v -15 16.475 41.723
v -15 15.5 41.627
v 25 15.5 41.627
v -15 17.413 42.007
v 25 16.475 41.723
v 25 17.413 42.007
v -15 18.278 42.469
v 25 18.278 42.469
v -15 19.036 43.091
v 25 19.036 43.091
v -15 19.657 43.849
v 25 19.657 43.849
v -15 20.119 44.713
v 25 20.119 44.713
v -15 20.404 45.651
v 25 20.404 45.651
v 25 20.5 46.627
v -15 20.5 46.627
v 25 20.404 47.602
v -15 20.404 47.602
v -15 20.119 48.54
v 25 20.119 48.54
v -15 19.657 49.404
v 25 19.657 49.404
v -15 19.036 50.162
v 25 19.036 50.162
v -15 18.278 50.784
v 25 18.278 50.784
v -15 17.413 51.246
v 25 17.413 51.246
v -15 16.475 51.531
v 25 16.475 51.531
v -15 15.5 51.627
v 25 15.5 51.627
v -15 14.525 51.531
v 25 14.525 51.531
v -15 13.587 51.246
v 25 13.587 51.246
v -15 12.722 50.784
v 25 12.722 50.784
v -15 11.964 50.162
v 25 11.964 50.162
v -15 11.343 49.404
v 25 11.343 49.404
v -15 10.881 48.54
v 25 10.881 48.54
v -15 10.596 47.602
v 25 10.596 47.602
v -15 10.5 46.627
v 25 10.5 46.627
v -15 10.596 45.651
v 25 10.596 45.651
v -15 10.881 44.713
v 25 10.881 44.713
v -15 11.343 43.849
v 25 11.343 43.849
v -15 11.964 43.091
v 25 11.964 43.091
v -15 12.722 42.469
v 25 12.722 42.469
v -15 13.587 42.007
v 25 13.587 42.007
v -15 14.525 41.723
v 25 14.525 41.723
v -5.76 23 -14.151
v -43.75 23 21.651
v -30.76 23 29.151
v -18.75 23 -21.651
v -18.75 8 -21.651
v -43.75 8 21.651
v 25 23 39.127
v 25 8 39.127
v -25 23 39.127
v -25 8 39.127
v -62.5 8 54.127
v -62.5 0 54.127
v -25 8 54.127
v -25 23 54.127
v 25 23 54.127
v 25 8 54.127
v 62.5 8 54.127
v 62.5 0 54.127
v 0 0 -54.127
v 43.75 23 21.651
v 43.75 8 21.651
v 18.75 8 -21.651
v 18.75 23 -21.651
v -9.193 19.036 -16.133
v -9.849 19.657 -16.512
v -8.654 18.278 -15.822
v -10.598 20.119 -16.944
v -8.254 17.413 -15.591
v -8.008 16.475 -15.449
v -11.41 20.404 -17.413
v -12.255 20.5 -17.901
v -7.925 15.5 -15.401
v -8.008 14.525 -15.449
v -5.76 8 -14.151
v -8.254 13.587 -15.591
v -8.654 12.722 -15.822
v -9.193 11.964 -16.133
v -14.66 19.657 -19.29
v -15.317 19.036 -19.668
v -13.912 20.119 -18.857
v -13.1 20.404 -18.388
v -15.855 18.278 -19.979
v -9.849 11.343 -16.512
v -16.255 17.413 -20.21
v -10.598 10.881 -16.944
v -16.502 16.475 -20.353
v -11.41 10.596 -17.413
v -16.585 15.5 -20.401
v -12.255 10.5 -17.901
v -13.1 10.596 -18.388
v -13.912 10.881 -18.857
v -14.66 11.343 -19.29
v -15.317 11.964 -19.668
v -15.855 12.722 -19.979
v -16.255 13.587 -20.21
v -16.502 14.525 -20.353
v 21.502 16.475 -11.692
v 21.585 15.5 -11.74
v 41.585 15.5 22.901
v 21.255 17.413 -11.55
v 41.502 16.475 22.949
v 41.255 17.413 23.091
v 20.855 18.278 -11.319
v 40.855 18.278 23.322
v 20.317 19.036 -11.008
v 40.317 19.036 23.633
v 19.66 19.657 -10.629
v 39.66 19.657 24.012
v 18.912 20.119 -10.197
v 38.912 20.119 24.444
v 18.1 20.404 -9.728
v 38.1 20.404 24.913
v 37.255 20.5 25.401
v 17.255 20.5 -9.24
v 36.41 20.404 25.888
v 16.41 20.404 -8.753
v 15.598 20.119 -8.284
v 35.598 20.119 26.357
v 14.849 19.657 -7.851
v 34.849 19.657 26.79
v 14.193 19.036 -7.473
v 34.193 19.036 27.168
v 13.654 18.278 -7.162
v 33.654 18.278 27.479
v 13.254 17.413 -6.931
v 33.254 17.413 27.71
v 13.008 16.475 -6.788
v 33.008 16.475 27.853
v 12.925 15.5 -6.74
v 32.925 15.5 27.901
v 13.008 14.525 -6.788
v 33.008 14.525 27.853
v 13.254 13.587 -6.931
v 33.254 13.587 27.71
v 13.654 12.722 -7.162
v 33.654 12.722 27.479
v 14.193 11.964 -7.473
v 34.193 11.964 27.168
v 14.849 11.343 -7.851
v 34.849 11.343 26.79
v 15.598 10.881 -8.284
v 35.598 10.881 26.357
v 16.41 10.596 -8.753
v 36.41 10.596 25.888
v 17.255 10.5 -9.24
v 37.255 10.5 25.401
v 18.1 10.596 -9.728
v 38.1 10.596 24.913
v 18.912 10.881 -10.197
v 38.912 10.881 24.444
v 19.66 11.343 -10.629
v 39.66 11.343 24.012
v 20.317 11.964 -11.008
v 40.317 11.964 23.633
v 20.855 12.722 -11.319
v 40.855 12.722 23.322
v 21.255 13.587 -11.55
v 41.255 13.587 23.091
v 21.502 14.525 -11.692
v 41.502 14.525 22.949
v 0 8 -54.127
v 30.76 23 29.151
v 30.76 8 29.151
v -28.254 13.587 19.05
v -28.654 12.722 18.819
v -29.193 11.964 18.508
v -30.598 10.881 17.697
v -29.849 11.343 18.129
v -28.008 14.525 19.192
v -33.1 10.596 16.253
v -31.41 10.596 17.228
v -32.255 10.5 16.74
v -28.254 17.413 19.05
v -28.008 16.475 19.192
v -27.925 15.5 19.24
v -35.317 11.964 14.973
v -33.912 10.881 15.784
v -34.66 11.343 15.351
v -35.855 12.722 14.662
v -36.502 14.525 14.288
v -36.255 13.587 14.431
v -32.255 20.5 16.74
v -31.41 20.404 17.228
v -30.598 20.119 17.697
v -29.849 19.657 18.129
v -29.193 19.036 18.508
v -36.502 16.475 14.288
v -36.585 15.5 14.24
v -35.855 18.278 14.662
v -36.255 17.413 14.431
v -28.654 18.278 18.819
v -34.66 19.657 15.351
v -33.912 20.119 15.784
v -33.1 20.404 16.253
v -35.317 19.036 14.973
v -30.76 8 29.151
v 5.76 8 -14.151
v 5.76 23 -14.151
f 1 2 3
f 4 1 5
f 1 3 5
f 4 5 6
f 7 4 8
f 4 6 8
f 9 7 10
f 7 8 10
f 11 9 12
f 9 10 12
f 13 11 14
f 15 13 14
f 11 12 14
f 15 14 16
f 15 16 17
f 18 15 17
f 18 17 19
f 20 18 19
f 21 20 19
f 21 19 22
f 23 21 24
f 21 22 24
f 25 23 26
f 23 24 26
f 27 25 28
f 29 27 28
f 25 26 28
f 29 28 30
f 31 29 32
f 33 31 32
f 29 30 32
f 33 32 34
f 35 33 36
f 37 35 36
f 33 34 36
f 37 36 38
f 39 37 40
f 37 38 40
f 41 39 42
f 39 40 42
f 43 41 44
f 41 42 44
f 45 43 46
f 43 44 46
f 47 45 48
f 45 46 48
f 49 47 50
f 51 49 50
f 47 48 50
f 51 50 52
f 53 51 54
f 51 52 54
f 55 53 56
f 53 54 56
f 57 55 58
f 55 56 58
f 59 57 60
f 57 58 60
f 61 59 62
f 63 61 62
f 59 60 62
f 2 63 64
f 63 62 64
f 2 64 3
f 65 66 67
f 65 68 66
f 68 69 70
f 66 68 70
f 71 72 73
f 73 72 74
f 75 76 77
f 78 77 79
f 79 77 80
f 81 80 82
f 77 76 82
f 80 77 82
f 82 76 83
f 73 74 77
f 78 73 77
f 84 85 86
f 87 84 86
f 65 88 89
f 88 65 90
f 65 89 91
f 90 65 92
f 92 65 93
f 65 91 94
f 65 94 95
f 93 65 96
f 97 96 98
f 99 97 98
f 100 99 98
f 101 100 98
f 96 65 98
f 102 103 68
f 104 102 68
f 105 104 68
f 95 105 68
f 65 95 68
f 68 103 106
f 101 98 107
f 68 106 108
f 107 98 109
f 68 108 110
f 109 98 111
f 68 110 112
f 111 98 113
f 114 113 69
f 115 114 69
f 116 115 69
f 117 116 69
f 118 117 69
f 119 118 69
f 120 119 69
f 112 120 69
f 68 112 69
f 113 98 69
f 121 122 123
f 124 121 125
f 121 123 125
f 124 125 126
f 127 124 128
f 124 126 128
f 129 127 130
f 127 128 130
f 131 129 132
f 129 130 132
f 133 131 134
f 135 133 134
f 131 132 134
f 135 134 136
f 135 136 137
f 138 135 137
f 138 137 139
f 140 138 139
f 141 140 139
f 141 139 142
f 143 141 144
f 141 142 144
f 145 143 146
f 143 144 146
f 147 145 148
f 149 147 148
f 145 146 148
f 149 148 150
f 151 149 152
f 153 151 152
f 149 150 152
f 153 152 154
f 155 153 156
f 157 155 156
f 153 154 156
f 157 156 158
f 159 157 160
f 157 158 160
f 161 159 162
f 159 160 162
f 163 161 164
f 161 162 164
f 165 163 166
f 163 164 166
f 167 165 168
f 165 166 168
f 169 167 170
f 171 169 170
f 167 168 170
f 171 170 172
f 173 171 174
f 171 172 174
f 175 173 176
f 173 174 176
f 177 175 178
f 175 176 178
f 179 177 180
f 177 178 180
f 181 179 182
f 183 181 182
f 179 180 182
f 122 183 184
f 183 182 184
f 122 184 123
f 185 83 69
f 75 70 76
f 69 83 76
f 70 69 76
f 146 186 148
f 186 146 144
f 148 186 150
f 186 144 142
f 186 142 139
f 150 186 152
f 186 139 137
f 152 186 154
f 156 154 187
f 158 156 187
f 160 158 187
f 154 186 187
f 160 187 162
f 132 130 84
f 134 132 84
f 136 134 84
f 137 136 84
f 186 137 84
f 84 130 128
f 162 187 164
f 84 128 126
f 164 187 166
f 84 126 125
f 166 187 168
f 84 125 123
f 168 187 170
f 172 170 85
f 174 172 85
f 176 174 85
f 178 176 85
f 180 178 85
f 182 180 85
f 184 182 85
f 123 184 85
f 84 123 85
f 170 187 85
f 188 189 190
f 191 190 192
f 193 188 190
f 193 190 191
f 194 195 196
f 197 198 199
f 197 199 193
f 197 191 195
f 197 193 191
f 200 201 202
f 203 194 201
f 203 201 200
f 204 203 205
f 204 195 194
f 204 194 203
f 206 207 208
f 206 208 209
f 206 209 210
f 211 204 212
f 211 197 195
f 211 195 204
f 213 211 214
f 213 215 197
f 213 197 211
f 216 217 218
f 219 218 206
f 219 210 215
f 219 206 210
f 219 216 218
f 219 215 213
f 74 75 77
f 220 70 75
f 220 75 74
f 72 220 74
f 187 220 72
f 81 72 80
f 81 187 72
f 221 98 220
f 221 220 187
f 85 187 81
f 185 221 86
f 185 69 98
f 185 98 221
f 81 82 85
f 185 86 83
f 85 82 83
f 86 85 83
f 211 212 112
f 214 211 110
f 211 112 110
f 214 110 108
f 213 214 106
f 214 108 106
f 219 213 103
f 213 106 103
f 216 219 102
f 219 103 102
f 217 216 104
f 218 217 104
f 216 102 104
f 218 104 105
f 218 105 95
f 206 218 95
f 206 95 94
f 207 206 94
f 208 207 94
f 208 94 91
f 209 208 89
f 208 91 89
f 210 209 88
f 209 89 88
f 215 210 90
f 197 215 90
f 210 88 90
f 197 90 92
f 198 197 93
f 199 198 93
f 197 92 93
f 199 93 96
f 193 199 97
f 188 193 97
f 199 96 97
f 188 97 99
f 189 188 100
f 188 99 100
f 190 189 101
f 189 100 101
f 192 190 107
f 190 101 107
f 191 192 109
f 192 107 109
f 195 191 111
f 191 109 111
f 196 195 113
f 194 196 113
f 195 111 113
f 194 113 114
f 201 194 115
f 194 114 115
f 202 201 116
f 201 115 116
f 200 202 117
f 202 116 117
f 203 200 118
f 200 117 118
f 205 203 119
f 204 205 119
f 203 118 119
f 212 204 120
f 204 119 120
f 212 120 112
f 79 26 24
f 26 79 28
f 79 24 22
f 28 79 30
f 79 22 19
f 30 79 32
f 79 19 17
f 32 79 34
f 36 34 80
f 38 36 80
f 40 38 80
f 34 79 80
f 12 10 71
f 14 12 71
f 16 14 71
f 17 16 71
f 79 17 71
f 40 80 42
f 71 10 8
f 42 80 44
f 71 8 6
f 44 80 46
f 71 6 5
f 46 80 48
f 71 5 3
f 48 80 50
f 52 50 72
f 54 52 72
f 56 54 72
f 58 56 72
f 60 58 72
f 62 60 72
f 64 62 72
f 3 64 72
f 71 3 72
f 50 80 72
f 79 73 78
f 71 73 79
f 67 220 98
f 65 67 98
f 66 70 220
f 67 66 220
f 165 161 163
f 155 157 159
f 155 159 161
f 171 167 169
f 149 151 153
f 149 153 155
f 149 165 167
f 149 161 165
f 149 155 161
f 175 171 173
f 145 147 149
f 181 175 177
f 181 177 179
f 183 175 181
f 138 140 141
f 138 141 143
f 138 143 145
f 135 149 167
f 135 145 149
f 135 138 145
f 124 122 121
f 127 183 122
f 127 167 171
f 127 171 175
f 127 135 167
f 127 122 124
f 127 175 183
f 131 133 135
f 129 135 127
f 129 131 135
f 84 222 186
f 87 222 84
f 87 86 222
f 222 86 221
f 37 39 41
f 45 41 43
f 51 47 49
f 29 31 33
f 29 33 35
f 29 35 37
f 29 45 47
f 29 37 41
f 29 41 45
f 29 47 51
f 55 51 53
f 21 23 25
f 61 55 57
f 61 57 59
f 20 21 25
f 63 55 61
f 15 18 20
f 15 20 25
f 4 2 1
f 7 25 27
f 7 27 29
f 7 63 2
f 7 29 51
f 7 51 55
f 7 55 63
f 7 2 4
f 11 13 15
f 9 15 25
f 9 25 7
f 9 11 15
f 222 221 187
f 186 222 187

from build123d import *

# Parameters (mm, degrees)
BOSS_EXTRUDE1_DEPTH = 8
BOSS_EXTRUDE2_DEPTH = 15
SKETCH4_R           = 5
CUT_EXTRUDE1_DEPTH  = 40
SKETCH5_R           = 5
CUT_EXTRUDE2_DEPTH  = 40
SKETCH6_R           = 5
CUT_EXTRUDE3_DEPTH  = 40


with BuildPart() as part:
    # Sketch2 → Boss-Extrude1 (new body)
    with BuildSketch(Plane(origin=(0, 0, 0), x_dir=(1, 0, 0), z_dir=(0, 1, 0))):
        Polygon((-62.5, -54.126587737), (62.5, -54.126587737), (0, 54.126587737), align=None)
    extrude(amount=BOSS_EXTRUDE1_DEPTH)

    # Sketch3 → Boss-Extrude2 (add)
    with BuildSketch(Plane(origin=(0, 8, 0), x_dir=(1, 0, 0), z_dir=(0, 1, 0))):
        Polygon((31.25, 0), (18.75, 21.650635095), (5.759618943, 14.150635095), (30.759618943, -29.150635095), (43.75, -21.650635095), align=None)
        Polygon((0, -54.126587737), (25, -54.126587737), (25, -39.126587737), (-25, -39.126587737), (-25, -54.126587737), align=None)
        Polygon((-31.25, 0), (-43.75, -21.650635095), (-30.759618943, -29.150635095), (-5.759618943, 14.150635095), (-18.75, 21.650635095), align=None)
    extrude(amount=BOSS_EXTRUDE2_DEPTH)

    # Sketch4 → Cut-Extrude1 (cut)
    with BuildSketch(Plane(origin=(25, 0, 0), x_dir=(0, 0, -1), z_dir=(1, 0, 0))):
        with Locations((-46.626587737, 15.5)):
            Circle(SKETCH4_R)
    extrude(amount=-CUT_EXTRUDE1_DEPTH, mode=Mode.SUBTRACT)

    # Sketch5 → Cut-Extrude2 (cut)
    with BuildSketch(Plane(origin=(20.3125, 0, 35.182282029), x_dir=(0.866025404, 0, -0.5), z_dir=(0.5, 0, 0.866025404))):
        with Locations((19.563293868, 15.5)):
            Circle(SKETCH5_R)
    extrude(amount=-CUT_EXTRUDE2_DEPTH, mode=Mode.SUBTRACT)

    # Sketch6 → Cut-Extrude3 (cut)
    with BuildSketch(Plane(origin=(4.6875, 0, -8.11898816), x_dir=(-0.866025404, 0, -0.5), z_dir=(0.5, 0, -0.866025404))):
        with Locations((19.563293868, 15.5)):
            Circle(SKETCH6_R)
    extrude(amount=-CUT_EXTRUDE3_DEPTH, mode=Mode.SUBTRACT)


solid = part.part
